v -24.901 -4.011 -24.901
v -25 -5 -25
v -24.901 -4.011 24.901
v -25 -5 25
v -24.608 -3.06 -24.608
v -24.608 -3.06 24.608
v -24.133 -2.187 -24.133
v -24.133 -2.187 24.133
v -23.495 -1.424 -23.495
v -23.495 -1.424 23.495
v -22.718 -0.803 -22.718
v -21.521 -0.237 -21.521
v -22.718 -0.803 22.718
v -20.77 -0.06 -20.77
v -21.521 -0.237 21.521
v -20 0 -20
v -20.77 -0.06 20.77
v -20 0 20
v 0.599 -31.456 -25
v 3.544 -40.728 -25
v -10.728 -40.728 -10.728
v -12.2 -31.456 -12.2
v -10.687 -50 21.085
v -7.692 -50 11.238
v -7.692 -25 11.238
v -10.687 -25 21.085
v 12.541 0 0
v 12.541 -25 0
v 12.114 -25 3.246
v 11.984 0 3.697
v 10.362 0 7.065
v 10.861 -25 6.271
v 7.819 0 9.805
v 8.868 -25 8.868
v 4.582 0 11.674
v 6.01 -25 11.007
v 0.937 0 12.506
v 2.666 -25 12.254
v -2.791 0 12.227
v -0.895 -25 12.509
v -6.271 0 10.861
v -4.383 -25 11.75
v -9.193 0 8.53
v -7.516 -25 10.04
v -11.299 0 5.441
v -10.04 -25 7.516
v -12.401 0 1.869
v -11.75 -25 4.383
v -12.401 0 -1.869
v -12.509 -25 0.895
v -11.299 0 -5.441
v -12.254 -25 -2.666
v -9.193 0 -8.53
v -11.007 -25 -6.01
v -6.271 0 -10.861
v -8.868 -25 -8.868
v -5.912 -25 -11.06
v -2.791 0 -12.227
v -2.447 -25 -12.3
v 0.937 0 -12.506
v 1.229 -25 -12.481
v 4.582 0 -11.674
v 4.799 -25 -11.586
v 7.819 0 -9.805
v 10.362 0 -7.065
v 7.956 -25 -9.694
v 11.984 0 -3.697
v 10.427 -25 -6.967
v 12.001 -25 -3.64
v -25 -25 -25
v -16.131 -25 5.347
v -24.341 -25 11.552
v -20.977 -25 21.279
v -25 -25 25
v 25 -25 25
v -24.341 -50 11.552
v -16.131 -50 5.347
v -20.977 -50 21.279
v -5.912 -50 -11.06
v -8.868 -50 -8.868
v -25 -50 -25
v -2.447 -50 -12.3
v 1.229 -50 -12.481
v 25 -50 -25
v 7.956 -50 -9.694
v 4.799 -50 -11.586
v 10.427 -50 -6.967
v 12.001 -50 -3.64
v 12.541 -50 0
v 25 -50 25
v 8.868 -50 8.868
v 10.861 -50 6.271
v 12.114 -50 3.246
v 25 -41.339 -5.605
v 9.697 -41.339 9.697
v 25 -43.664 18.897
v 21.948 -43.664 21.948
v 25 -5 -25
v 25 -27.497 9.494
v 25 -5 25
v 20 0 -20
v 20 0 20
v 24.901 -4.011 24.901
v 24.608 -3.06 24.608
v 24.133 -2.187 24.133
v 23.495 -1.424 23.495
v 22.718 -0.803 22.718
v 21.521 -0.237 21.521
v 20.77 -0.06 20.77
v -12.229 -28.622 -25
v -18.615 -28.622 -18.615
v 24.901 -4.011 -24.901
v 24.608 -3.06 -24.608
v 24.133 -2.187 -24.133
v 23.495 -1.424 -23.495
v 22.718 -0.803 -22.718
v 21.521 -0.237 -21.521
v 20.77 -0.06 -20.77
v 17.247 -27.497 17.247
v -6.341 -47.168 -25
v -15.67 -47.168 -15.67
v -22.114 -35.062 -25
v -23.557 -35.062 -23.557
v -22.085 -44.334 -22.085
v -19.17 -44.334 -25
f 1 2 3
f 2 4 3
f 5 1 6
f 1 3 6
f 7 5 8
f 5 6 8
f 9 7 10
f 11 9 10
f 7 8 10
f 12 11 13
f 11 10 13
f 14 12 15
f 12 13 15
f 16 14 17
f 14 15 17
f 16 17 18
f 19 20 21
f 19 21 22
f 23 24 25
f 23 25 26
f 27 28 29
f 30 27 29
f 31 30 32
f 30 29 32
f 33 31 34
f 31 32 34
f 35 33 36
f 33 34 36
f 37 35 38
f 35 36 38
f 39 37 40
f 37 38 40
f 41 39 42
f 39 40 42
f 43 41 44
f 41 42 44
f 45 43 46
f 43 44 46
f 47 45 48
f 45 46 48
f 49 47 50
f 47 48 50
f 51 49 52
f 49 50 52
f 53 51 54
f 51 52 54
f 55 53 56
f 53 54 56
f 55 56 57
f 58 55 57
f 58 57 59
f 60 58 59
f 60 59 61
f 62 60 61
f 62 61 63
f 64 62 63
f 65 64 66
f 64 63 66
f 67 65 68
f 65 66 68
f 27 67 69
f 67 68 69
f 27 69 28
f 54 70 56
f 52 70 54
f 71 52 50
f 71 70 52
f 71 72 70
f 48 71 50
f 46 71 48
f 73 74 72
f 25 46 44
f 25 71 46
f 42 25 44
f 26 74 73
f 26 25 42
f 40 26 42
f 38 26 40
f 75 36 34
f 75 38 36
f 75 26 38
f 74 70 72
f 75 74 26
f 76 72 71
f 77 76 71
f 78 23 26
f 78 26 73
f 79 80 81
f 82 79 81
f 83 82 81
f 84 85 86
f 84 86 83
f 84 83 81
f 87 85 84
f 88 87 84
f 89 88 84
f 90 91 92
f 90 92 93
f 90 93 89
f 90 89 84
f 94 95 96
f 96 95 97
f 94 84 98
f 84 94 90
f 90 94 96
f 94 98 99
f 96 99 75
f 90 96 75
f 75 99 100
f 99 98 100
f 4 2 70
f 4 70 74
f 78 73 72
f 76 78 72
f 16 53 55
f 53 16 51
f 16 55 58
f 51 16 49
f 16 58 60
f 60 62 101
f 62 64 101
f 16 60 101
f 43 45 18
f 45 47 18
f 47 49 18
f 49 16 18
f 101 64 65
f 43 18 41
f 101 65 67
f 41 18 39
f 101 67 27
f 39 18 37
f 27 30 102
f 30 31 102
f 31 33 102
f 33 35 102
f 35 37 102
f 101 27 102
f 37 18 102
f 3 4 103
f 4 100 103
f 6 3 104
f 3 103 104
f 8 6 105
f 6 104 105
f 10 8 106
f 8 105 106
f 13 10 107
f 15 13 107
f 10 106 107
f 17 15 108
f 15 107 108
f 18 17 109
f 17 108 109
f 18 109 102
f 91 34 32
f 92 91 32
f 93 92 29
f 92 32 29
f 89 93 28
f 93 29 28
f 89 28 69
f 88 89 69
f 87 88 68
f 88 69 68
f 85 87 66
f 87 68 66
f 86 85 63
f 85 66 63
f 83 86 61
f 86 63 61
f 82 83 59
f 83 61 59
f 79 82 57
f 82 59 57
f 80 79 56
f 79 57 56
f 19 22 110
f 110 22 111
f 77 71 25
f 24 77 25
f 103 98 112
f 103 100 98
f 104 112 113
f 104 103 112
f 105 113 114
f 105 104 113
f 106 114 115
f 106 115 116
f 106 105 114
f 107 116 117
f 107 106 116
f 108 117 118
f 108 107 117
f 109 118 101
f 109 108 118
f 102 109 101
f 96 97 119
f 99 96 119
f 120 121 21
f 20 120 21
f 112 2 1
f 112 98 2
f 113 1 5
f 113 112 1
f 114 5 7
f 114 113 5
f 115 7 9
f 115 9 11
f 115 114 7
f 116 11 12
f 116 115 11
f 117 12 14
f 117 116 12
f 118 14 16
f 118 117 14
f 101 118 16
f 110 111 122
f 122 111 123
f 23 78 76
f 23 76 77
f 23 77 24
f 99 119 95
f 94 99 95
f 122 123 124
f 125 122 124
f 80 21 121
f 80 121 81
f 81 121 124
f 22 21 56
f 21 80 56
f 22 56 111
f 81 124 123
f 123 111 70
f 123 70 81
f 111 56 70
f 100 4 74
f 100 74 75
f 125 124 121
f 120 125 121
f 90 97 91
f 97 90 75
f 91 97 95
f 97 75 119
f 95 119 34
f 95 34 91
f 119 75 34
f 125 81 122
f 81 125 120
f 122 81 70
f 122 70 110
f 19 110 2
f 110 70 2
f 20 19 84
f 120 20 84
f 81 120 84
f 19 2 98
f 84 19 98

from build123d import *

# Parameters (mm, degrees)
F0_W     = 50
F0_H     = 50
F1_DEPTH = 25
F2_R     = 12.5410475497
F3_DEPTH = 25
F5_DEPTH = 25
F7_DEPTH = 50
F9_DEPTH = 25
F10_R    = 5


with BuildPart() as f1:
    # F0 (on Front) → F1 (new body)
    with BuildSketch(Plane.XZ):
        Rectangle(F0_W, F0_H)
    extrude(amount=F1_DEPTH)

    # F2 (on face) → F3 (cut)
    with BuildSketch(Plane.XZ.offset(25)):
        Circle(F2_R)
    extrude(amount=-F3_DEPTH, mode=Mode.SUBTRACT)

    # F4 (on face) → F5 (join)
    with BuildSketch(Plane.XZ.offset(25)):
        with BuildLine():
            Line((-8.8678597656, -8.8678597656), (-25, -25))
            Line((-25, -25), (25, -25))
            Line((25, -25), (25, 25))
            Line((25, 25), (8.8678597656, 8.8678597656))
            ThreePointArc((8.8678597656, 8.8678597656), (11.5864171474, 4.7992511218), (12.5410475497, 0))
            ThreePointArc((12.5410475497, 0), (4.7992511218, -11.5864171474), (-8.8678597656, -8.8678597656))
        make_face()
    extrude(amount=F5_DEPTH)

    # F6 (on face) → F7 (cut)
    with BuildSketch(Plane(origin=(0, 0, 0), x_dir=(0, -1, 0), z_dir=(-0.7071067812, 0, 0.7071067812))):
        Polygon((28.62248093, -26.3251687907), (35.0618112076, -33.3145719446), (44.3344770349, -31.2326499178), (47.1678125847, -22.1613247372), (40.7284823072, -15.1719215833), (31.4558164798, -17.2538436101), align=None)
        Polygon((27.4971282132, 24.391054001), (41.3385996573, 13.714221481), (43.6642721295, 31.0397036374), align=None)
    extrude(amount=-F7_DEPTH, mode=Mode.SUBTRACT)

    # F8 (on face) → F9 (join)
    with BuildSketch(Plane.XZ.offset(25)):
        Polygon((-20.9768815232, 21.2787960948), (-24.3413792657, 11.5523586689), (-16.1306745515, 5.3468967076), (-7.691682224, 11.2381477254), (-10.6868028491, 21.084603052), align=None)
    extrude(amount=F9_DEPTH)

    # F10
    f10_edges = [f1.edges().sort_by_distance(p)[0] for p in [
        (25, 0, 0),
        (0, 0, 25),
        (-25, 0, 0),
        (0, 0, -25),
    ]]
    fillet(f10_edges, radius=F10_R)


solid = f1.part
